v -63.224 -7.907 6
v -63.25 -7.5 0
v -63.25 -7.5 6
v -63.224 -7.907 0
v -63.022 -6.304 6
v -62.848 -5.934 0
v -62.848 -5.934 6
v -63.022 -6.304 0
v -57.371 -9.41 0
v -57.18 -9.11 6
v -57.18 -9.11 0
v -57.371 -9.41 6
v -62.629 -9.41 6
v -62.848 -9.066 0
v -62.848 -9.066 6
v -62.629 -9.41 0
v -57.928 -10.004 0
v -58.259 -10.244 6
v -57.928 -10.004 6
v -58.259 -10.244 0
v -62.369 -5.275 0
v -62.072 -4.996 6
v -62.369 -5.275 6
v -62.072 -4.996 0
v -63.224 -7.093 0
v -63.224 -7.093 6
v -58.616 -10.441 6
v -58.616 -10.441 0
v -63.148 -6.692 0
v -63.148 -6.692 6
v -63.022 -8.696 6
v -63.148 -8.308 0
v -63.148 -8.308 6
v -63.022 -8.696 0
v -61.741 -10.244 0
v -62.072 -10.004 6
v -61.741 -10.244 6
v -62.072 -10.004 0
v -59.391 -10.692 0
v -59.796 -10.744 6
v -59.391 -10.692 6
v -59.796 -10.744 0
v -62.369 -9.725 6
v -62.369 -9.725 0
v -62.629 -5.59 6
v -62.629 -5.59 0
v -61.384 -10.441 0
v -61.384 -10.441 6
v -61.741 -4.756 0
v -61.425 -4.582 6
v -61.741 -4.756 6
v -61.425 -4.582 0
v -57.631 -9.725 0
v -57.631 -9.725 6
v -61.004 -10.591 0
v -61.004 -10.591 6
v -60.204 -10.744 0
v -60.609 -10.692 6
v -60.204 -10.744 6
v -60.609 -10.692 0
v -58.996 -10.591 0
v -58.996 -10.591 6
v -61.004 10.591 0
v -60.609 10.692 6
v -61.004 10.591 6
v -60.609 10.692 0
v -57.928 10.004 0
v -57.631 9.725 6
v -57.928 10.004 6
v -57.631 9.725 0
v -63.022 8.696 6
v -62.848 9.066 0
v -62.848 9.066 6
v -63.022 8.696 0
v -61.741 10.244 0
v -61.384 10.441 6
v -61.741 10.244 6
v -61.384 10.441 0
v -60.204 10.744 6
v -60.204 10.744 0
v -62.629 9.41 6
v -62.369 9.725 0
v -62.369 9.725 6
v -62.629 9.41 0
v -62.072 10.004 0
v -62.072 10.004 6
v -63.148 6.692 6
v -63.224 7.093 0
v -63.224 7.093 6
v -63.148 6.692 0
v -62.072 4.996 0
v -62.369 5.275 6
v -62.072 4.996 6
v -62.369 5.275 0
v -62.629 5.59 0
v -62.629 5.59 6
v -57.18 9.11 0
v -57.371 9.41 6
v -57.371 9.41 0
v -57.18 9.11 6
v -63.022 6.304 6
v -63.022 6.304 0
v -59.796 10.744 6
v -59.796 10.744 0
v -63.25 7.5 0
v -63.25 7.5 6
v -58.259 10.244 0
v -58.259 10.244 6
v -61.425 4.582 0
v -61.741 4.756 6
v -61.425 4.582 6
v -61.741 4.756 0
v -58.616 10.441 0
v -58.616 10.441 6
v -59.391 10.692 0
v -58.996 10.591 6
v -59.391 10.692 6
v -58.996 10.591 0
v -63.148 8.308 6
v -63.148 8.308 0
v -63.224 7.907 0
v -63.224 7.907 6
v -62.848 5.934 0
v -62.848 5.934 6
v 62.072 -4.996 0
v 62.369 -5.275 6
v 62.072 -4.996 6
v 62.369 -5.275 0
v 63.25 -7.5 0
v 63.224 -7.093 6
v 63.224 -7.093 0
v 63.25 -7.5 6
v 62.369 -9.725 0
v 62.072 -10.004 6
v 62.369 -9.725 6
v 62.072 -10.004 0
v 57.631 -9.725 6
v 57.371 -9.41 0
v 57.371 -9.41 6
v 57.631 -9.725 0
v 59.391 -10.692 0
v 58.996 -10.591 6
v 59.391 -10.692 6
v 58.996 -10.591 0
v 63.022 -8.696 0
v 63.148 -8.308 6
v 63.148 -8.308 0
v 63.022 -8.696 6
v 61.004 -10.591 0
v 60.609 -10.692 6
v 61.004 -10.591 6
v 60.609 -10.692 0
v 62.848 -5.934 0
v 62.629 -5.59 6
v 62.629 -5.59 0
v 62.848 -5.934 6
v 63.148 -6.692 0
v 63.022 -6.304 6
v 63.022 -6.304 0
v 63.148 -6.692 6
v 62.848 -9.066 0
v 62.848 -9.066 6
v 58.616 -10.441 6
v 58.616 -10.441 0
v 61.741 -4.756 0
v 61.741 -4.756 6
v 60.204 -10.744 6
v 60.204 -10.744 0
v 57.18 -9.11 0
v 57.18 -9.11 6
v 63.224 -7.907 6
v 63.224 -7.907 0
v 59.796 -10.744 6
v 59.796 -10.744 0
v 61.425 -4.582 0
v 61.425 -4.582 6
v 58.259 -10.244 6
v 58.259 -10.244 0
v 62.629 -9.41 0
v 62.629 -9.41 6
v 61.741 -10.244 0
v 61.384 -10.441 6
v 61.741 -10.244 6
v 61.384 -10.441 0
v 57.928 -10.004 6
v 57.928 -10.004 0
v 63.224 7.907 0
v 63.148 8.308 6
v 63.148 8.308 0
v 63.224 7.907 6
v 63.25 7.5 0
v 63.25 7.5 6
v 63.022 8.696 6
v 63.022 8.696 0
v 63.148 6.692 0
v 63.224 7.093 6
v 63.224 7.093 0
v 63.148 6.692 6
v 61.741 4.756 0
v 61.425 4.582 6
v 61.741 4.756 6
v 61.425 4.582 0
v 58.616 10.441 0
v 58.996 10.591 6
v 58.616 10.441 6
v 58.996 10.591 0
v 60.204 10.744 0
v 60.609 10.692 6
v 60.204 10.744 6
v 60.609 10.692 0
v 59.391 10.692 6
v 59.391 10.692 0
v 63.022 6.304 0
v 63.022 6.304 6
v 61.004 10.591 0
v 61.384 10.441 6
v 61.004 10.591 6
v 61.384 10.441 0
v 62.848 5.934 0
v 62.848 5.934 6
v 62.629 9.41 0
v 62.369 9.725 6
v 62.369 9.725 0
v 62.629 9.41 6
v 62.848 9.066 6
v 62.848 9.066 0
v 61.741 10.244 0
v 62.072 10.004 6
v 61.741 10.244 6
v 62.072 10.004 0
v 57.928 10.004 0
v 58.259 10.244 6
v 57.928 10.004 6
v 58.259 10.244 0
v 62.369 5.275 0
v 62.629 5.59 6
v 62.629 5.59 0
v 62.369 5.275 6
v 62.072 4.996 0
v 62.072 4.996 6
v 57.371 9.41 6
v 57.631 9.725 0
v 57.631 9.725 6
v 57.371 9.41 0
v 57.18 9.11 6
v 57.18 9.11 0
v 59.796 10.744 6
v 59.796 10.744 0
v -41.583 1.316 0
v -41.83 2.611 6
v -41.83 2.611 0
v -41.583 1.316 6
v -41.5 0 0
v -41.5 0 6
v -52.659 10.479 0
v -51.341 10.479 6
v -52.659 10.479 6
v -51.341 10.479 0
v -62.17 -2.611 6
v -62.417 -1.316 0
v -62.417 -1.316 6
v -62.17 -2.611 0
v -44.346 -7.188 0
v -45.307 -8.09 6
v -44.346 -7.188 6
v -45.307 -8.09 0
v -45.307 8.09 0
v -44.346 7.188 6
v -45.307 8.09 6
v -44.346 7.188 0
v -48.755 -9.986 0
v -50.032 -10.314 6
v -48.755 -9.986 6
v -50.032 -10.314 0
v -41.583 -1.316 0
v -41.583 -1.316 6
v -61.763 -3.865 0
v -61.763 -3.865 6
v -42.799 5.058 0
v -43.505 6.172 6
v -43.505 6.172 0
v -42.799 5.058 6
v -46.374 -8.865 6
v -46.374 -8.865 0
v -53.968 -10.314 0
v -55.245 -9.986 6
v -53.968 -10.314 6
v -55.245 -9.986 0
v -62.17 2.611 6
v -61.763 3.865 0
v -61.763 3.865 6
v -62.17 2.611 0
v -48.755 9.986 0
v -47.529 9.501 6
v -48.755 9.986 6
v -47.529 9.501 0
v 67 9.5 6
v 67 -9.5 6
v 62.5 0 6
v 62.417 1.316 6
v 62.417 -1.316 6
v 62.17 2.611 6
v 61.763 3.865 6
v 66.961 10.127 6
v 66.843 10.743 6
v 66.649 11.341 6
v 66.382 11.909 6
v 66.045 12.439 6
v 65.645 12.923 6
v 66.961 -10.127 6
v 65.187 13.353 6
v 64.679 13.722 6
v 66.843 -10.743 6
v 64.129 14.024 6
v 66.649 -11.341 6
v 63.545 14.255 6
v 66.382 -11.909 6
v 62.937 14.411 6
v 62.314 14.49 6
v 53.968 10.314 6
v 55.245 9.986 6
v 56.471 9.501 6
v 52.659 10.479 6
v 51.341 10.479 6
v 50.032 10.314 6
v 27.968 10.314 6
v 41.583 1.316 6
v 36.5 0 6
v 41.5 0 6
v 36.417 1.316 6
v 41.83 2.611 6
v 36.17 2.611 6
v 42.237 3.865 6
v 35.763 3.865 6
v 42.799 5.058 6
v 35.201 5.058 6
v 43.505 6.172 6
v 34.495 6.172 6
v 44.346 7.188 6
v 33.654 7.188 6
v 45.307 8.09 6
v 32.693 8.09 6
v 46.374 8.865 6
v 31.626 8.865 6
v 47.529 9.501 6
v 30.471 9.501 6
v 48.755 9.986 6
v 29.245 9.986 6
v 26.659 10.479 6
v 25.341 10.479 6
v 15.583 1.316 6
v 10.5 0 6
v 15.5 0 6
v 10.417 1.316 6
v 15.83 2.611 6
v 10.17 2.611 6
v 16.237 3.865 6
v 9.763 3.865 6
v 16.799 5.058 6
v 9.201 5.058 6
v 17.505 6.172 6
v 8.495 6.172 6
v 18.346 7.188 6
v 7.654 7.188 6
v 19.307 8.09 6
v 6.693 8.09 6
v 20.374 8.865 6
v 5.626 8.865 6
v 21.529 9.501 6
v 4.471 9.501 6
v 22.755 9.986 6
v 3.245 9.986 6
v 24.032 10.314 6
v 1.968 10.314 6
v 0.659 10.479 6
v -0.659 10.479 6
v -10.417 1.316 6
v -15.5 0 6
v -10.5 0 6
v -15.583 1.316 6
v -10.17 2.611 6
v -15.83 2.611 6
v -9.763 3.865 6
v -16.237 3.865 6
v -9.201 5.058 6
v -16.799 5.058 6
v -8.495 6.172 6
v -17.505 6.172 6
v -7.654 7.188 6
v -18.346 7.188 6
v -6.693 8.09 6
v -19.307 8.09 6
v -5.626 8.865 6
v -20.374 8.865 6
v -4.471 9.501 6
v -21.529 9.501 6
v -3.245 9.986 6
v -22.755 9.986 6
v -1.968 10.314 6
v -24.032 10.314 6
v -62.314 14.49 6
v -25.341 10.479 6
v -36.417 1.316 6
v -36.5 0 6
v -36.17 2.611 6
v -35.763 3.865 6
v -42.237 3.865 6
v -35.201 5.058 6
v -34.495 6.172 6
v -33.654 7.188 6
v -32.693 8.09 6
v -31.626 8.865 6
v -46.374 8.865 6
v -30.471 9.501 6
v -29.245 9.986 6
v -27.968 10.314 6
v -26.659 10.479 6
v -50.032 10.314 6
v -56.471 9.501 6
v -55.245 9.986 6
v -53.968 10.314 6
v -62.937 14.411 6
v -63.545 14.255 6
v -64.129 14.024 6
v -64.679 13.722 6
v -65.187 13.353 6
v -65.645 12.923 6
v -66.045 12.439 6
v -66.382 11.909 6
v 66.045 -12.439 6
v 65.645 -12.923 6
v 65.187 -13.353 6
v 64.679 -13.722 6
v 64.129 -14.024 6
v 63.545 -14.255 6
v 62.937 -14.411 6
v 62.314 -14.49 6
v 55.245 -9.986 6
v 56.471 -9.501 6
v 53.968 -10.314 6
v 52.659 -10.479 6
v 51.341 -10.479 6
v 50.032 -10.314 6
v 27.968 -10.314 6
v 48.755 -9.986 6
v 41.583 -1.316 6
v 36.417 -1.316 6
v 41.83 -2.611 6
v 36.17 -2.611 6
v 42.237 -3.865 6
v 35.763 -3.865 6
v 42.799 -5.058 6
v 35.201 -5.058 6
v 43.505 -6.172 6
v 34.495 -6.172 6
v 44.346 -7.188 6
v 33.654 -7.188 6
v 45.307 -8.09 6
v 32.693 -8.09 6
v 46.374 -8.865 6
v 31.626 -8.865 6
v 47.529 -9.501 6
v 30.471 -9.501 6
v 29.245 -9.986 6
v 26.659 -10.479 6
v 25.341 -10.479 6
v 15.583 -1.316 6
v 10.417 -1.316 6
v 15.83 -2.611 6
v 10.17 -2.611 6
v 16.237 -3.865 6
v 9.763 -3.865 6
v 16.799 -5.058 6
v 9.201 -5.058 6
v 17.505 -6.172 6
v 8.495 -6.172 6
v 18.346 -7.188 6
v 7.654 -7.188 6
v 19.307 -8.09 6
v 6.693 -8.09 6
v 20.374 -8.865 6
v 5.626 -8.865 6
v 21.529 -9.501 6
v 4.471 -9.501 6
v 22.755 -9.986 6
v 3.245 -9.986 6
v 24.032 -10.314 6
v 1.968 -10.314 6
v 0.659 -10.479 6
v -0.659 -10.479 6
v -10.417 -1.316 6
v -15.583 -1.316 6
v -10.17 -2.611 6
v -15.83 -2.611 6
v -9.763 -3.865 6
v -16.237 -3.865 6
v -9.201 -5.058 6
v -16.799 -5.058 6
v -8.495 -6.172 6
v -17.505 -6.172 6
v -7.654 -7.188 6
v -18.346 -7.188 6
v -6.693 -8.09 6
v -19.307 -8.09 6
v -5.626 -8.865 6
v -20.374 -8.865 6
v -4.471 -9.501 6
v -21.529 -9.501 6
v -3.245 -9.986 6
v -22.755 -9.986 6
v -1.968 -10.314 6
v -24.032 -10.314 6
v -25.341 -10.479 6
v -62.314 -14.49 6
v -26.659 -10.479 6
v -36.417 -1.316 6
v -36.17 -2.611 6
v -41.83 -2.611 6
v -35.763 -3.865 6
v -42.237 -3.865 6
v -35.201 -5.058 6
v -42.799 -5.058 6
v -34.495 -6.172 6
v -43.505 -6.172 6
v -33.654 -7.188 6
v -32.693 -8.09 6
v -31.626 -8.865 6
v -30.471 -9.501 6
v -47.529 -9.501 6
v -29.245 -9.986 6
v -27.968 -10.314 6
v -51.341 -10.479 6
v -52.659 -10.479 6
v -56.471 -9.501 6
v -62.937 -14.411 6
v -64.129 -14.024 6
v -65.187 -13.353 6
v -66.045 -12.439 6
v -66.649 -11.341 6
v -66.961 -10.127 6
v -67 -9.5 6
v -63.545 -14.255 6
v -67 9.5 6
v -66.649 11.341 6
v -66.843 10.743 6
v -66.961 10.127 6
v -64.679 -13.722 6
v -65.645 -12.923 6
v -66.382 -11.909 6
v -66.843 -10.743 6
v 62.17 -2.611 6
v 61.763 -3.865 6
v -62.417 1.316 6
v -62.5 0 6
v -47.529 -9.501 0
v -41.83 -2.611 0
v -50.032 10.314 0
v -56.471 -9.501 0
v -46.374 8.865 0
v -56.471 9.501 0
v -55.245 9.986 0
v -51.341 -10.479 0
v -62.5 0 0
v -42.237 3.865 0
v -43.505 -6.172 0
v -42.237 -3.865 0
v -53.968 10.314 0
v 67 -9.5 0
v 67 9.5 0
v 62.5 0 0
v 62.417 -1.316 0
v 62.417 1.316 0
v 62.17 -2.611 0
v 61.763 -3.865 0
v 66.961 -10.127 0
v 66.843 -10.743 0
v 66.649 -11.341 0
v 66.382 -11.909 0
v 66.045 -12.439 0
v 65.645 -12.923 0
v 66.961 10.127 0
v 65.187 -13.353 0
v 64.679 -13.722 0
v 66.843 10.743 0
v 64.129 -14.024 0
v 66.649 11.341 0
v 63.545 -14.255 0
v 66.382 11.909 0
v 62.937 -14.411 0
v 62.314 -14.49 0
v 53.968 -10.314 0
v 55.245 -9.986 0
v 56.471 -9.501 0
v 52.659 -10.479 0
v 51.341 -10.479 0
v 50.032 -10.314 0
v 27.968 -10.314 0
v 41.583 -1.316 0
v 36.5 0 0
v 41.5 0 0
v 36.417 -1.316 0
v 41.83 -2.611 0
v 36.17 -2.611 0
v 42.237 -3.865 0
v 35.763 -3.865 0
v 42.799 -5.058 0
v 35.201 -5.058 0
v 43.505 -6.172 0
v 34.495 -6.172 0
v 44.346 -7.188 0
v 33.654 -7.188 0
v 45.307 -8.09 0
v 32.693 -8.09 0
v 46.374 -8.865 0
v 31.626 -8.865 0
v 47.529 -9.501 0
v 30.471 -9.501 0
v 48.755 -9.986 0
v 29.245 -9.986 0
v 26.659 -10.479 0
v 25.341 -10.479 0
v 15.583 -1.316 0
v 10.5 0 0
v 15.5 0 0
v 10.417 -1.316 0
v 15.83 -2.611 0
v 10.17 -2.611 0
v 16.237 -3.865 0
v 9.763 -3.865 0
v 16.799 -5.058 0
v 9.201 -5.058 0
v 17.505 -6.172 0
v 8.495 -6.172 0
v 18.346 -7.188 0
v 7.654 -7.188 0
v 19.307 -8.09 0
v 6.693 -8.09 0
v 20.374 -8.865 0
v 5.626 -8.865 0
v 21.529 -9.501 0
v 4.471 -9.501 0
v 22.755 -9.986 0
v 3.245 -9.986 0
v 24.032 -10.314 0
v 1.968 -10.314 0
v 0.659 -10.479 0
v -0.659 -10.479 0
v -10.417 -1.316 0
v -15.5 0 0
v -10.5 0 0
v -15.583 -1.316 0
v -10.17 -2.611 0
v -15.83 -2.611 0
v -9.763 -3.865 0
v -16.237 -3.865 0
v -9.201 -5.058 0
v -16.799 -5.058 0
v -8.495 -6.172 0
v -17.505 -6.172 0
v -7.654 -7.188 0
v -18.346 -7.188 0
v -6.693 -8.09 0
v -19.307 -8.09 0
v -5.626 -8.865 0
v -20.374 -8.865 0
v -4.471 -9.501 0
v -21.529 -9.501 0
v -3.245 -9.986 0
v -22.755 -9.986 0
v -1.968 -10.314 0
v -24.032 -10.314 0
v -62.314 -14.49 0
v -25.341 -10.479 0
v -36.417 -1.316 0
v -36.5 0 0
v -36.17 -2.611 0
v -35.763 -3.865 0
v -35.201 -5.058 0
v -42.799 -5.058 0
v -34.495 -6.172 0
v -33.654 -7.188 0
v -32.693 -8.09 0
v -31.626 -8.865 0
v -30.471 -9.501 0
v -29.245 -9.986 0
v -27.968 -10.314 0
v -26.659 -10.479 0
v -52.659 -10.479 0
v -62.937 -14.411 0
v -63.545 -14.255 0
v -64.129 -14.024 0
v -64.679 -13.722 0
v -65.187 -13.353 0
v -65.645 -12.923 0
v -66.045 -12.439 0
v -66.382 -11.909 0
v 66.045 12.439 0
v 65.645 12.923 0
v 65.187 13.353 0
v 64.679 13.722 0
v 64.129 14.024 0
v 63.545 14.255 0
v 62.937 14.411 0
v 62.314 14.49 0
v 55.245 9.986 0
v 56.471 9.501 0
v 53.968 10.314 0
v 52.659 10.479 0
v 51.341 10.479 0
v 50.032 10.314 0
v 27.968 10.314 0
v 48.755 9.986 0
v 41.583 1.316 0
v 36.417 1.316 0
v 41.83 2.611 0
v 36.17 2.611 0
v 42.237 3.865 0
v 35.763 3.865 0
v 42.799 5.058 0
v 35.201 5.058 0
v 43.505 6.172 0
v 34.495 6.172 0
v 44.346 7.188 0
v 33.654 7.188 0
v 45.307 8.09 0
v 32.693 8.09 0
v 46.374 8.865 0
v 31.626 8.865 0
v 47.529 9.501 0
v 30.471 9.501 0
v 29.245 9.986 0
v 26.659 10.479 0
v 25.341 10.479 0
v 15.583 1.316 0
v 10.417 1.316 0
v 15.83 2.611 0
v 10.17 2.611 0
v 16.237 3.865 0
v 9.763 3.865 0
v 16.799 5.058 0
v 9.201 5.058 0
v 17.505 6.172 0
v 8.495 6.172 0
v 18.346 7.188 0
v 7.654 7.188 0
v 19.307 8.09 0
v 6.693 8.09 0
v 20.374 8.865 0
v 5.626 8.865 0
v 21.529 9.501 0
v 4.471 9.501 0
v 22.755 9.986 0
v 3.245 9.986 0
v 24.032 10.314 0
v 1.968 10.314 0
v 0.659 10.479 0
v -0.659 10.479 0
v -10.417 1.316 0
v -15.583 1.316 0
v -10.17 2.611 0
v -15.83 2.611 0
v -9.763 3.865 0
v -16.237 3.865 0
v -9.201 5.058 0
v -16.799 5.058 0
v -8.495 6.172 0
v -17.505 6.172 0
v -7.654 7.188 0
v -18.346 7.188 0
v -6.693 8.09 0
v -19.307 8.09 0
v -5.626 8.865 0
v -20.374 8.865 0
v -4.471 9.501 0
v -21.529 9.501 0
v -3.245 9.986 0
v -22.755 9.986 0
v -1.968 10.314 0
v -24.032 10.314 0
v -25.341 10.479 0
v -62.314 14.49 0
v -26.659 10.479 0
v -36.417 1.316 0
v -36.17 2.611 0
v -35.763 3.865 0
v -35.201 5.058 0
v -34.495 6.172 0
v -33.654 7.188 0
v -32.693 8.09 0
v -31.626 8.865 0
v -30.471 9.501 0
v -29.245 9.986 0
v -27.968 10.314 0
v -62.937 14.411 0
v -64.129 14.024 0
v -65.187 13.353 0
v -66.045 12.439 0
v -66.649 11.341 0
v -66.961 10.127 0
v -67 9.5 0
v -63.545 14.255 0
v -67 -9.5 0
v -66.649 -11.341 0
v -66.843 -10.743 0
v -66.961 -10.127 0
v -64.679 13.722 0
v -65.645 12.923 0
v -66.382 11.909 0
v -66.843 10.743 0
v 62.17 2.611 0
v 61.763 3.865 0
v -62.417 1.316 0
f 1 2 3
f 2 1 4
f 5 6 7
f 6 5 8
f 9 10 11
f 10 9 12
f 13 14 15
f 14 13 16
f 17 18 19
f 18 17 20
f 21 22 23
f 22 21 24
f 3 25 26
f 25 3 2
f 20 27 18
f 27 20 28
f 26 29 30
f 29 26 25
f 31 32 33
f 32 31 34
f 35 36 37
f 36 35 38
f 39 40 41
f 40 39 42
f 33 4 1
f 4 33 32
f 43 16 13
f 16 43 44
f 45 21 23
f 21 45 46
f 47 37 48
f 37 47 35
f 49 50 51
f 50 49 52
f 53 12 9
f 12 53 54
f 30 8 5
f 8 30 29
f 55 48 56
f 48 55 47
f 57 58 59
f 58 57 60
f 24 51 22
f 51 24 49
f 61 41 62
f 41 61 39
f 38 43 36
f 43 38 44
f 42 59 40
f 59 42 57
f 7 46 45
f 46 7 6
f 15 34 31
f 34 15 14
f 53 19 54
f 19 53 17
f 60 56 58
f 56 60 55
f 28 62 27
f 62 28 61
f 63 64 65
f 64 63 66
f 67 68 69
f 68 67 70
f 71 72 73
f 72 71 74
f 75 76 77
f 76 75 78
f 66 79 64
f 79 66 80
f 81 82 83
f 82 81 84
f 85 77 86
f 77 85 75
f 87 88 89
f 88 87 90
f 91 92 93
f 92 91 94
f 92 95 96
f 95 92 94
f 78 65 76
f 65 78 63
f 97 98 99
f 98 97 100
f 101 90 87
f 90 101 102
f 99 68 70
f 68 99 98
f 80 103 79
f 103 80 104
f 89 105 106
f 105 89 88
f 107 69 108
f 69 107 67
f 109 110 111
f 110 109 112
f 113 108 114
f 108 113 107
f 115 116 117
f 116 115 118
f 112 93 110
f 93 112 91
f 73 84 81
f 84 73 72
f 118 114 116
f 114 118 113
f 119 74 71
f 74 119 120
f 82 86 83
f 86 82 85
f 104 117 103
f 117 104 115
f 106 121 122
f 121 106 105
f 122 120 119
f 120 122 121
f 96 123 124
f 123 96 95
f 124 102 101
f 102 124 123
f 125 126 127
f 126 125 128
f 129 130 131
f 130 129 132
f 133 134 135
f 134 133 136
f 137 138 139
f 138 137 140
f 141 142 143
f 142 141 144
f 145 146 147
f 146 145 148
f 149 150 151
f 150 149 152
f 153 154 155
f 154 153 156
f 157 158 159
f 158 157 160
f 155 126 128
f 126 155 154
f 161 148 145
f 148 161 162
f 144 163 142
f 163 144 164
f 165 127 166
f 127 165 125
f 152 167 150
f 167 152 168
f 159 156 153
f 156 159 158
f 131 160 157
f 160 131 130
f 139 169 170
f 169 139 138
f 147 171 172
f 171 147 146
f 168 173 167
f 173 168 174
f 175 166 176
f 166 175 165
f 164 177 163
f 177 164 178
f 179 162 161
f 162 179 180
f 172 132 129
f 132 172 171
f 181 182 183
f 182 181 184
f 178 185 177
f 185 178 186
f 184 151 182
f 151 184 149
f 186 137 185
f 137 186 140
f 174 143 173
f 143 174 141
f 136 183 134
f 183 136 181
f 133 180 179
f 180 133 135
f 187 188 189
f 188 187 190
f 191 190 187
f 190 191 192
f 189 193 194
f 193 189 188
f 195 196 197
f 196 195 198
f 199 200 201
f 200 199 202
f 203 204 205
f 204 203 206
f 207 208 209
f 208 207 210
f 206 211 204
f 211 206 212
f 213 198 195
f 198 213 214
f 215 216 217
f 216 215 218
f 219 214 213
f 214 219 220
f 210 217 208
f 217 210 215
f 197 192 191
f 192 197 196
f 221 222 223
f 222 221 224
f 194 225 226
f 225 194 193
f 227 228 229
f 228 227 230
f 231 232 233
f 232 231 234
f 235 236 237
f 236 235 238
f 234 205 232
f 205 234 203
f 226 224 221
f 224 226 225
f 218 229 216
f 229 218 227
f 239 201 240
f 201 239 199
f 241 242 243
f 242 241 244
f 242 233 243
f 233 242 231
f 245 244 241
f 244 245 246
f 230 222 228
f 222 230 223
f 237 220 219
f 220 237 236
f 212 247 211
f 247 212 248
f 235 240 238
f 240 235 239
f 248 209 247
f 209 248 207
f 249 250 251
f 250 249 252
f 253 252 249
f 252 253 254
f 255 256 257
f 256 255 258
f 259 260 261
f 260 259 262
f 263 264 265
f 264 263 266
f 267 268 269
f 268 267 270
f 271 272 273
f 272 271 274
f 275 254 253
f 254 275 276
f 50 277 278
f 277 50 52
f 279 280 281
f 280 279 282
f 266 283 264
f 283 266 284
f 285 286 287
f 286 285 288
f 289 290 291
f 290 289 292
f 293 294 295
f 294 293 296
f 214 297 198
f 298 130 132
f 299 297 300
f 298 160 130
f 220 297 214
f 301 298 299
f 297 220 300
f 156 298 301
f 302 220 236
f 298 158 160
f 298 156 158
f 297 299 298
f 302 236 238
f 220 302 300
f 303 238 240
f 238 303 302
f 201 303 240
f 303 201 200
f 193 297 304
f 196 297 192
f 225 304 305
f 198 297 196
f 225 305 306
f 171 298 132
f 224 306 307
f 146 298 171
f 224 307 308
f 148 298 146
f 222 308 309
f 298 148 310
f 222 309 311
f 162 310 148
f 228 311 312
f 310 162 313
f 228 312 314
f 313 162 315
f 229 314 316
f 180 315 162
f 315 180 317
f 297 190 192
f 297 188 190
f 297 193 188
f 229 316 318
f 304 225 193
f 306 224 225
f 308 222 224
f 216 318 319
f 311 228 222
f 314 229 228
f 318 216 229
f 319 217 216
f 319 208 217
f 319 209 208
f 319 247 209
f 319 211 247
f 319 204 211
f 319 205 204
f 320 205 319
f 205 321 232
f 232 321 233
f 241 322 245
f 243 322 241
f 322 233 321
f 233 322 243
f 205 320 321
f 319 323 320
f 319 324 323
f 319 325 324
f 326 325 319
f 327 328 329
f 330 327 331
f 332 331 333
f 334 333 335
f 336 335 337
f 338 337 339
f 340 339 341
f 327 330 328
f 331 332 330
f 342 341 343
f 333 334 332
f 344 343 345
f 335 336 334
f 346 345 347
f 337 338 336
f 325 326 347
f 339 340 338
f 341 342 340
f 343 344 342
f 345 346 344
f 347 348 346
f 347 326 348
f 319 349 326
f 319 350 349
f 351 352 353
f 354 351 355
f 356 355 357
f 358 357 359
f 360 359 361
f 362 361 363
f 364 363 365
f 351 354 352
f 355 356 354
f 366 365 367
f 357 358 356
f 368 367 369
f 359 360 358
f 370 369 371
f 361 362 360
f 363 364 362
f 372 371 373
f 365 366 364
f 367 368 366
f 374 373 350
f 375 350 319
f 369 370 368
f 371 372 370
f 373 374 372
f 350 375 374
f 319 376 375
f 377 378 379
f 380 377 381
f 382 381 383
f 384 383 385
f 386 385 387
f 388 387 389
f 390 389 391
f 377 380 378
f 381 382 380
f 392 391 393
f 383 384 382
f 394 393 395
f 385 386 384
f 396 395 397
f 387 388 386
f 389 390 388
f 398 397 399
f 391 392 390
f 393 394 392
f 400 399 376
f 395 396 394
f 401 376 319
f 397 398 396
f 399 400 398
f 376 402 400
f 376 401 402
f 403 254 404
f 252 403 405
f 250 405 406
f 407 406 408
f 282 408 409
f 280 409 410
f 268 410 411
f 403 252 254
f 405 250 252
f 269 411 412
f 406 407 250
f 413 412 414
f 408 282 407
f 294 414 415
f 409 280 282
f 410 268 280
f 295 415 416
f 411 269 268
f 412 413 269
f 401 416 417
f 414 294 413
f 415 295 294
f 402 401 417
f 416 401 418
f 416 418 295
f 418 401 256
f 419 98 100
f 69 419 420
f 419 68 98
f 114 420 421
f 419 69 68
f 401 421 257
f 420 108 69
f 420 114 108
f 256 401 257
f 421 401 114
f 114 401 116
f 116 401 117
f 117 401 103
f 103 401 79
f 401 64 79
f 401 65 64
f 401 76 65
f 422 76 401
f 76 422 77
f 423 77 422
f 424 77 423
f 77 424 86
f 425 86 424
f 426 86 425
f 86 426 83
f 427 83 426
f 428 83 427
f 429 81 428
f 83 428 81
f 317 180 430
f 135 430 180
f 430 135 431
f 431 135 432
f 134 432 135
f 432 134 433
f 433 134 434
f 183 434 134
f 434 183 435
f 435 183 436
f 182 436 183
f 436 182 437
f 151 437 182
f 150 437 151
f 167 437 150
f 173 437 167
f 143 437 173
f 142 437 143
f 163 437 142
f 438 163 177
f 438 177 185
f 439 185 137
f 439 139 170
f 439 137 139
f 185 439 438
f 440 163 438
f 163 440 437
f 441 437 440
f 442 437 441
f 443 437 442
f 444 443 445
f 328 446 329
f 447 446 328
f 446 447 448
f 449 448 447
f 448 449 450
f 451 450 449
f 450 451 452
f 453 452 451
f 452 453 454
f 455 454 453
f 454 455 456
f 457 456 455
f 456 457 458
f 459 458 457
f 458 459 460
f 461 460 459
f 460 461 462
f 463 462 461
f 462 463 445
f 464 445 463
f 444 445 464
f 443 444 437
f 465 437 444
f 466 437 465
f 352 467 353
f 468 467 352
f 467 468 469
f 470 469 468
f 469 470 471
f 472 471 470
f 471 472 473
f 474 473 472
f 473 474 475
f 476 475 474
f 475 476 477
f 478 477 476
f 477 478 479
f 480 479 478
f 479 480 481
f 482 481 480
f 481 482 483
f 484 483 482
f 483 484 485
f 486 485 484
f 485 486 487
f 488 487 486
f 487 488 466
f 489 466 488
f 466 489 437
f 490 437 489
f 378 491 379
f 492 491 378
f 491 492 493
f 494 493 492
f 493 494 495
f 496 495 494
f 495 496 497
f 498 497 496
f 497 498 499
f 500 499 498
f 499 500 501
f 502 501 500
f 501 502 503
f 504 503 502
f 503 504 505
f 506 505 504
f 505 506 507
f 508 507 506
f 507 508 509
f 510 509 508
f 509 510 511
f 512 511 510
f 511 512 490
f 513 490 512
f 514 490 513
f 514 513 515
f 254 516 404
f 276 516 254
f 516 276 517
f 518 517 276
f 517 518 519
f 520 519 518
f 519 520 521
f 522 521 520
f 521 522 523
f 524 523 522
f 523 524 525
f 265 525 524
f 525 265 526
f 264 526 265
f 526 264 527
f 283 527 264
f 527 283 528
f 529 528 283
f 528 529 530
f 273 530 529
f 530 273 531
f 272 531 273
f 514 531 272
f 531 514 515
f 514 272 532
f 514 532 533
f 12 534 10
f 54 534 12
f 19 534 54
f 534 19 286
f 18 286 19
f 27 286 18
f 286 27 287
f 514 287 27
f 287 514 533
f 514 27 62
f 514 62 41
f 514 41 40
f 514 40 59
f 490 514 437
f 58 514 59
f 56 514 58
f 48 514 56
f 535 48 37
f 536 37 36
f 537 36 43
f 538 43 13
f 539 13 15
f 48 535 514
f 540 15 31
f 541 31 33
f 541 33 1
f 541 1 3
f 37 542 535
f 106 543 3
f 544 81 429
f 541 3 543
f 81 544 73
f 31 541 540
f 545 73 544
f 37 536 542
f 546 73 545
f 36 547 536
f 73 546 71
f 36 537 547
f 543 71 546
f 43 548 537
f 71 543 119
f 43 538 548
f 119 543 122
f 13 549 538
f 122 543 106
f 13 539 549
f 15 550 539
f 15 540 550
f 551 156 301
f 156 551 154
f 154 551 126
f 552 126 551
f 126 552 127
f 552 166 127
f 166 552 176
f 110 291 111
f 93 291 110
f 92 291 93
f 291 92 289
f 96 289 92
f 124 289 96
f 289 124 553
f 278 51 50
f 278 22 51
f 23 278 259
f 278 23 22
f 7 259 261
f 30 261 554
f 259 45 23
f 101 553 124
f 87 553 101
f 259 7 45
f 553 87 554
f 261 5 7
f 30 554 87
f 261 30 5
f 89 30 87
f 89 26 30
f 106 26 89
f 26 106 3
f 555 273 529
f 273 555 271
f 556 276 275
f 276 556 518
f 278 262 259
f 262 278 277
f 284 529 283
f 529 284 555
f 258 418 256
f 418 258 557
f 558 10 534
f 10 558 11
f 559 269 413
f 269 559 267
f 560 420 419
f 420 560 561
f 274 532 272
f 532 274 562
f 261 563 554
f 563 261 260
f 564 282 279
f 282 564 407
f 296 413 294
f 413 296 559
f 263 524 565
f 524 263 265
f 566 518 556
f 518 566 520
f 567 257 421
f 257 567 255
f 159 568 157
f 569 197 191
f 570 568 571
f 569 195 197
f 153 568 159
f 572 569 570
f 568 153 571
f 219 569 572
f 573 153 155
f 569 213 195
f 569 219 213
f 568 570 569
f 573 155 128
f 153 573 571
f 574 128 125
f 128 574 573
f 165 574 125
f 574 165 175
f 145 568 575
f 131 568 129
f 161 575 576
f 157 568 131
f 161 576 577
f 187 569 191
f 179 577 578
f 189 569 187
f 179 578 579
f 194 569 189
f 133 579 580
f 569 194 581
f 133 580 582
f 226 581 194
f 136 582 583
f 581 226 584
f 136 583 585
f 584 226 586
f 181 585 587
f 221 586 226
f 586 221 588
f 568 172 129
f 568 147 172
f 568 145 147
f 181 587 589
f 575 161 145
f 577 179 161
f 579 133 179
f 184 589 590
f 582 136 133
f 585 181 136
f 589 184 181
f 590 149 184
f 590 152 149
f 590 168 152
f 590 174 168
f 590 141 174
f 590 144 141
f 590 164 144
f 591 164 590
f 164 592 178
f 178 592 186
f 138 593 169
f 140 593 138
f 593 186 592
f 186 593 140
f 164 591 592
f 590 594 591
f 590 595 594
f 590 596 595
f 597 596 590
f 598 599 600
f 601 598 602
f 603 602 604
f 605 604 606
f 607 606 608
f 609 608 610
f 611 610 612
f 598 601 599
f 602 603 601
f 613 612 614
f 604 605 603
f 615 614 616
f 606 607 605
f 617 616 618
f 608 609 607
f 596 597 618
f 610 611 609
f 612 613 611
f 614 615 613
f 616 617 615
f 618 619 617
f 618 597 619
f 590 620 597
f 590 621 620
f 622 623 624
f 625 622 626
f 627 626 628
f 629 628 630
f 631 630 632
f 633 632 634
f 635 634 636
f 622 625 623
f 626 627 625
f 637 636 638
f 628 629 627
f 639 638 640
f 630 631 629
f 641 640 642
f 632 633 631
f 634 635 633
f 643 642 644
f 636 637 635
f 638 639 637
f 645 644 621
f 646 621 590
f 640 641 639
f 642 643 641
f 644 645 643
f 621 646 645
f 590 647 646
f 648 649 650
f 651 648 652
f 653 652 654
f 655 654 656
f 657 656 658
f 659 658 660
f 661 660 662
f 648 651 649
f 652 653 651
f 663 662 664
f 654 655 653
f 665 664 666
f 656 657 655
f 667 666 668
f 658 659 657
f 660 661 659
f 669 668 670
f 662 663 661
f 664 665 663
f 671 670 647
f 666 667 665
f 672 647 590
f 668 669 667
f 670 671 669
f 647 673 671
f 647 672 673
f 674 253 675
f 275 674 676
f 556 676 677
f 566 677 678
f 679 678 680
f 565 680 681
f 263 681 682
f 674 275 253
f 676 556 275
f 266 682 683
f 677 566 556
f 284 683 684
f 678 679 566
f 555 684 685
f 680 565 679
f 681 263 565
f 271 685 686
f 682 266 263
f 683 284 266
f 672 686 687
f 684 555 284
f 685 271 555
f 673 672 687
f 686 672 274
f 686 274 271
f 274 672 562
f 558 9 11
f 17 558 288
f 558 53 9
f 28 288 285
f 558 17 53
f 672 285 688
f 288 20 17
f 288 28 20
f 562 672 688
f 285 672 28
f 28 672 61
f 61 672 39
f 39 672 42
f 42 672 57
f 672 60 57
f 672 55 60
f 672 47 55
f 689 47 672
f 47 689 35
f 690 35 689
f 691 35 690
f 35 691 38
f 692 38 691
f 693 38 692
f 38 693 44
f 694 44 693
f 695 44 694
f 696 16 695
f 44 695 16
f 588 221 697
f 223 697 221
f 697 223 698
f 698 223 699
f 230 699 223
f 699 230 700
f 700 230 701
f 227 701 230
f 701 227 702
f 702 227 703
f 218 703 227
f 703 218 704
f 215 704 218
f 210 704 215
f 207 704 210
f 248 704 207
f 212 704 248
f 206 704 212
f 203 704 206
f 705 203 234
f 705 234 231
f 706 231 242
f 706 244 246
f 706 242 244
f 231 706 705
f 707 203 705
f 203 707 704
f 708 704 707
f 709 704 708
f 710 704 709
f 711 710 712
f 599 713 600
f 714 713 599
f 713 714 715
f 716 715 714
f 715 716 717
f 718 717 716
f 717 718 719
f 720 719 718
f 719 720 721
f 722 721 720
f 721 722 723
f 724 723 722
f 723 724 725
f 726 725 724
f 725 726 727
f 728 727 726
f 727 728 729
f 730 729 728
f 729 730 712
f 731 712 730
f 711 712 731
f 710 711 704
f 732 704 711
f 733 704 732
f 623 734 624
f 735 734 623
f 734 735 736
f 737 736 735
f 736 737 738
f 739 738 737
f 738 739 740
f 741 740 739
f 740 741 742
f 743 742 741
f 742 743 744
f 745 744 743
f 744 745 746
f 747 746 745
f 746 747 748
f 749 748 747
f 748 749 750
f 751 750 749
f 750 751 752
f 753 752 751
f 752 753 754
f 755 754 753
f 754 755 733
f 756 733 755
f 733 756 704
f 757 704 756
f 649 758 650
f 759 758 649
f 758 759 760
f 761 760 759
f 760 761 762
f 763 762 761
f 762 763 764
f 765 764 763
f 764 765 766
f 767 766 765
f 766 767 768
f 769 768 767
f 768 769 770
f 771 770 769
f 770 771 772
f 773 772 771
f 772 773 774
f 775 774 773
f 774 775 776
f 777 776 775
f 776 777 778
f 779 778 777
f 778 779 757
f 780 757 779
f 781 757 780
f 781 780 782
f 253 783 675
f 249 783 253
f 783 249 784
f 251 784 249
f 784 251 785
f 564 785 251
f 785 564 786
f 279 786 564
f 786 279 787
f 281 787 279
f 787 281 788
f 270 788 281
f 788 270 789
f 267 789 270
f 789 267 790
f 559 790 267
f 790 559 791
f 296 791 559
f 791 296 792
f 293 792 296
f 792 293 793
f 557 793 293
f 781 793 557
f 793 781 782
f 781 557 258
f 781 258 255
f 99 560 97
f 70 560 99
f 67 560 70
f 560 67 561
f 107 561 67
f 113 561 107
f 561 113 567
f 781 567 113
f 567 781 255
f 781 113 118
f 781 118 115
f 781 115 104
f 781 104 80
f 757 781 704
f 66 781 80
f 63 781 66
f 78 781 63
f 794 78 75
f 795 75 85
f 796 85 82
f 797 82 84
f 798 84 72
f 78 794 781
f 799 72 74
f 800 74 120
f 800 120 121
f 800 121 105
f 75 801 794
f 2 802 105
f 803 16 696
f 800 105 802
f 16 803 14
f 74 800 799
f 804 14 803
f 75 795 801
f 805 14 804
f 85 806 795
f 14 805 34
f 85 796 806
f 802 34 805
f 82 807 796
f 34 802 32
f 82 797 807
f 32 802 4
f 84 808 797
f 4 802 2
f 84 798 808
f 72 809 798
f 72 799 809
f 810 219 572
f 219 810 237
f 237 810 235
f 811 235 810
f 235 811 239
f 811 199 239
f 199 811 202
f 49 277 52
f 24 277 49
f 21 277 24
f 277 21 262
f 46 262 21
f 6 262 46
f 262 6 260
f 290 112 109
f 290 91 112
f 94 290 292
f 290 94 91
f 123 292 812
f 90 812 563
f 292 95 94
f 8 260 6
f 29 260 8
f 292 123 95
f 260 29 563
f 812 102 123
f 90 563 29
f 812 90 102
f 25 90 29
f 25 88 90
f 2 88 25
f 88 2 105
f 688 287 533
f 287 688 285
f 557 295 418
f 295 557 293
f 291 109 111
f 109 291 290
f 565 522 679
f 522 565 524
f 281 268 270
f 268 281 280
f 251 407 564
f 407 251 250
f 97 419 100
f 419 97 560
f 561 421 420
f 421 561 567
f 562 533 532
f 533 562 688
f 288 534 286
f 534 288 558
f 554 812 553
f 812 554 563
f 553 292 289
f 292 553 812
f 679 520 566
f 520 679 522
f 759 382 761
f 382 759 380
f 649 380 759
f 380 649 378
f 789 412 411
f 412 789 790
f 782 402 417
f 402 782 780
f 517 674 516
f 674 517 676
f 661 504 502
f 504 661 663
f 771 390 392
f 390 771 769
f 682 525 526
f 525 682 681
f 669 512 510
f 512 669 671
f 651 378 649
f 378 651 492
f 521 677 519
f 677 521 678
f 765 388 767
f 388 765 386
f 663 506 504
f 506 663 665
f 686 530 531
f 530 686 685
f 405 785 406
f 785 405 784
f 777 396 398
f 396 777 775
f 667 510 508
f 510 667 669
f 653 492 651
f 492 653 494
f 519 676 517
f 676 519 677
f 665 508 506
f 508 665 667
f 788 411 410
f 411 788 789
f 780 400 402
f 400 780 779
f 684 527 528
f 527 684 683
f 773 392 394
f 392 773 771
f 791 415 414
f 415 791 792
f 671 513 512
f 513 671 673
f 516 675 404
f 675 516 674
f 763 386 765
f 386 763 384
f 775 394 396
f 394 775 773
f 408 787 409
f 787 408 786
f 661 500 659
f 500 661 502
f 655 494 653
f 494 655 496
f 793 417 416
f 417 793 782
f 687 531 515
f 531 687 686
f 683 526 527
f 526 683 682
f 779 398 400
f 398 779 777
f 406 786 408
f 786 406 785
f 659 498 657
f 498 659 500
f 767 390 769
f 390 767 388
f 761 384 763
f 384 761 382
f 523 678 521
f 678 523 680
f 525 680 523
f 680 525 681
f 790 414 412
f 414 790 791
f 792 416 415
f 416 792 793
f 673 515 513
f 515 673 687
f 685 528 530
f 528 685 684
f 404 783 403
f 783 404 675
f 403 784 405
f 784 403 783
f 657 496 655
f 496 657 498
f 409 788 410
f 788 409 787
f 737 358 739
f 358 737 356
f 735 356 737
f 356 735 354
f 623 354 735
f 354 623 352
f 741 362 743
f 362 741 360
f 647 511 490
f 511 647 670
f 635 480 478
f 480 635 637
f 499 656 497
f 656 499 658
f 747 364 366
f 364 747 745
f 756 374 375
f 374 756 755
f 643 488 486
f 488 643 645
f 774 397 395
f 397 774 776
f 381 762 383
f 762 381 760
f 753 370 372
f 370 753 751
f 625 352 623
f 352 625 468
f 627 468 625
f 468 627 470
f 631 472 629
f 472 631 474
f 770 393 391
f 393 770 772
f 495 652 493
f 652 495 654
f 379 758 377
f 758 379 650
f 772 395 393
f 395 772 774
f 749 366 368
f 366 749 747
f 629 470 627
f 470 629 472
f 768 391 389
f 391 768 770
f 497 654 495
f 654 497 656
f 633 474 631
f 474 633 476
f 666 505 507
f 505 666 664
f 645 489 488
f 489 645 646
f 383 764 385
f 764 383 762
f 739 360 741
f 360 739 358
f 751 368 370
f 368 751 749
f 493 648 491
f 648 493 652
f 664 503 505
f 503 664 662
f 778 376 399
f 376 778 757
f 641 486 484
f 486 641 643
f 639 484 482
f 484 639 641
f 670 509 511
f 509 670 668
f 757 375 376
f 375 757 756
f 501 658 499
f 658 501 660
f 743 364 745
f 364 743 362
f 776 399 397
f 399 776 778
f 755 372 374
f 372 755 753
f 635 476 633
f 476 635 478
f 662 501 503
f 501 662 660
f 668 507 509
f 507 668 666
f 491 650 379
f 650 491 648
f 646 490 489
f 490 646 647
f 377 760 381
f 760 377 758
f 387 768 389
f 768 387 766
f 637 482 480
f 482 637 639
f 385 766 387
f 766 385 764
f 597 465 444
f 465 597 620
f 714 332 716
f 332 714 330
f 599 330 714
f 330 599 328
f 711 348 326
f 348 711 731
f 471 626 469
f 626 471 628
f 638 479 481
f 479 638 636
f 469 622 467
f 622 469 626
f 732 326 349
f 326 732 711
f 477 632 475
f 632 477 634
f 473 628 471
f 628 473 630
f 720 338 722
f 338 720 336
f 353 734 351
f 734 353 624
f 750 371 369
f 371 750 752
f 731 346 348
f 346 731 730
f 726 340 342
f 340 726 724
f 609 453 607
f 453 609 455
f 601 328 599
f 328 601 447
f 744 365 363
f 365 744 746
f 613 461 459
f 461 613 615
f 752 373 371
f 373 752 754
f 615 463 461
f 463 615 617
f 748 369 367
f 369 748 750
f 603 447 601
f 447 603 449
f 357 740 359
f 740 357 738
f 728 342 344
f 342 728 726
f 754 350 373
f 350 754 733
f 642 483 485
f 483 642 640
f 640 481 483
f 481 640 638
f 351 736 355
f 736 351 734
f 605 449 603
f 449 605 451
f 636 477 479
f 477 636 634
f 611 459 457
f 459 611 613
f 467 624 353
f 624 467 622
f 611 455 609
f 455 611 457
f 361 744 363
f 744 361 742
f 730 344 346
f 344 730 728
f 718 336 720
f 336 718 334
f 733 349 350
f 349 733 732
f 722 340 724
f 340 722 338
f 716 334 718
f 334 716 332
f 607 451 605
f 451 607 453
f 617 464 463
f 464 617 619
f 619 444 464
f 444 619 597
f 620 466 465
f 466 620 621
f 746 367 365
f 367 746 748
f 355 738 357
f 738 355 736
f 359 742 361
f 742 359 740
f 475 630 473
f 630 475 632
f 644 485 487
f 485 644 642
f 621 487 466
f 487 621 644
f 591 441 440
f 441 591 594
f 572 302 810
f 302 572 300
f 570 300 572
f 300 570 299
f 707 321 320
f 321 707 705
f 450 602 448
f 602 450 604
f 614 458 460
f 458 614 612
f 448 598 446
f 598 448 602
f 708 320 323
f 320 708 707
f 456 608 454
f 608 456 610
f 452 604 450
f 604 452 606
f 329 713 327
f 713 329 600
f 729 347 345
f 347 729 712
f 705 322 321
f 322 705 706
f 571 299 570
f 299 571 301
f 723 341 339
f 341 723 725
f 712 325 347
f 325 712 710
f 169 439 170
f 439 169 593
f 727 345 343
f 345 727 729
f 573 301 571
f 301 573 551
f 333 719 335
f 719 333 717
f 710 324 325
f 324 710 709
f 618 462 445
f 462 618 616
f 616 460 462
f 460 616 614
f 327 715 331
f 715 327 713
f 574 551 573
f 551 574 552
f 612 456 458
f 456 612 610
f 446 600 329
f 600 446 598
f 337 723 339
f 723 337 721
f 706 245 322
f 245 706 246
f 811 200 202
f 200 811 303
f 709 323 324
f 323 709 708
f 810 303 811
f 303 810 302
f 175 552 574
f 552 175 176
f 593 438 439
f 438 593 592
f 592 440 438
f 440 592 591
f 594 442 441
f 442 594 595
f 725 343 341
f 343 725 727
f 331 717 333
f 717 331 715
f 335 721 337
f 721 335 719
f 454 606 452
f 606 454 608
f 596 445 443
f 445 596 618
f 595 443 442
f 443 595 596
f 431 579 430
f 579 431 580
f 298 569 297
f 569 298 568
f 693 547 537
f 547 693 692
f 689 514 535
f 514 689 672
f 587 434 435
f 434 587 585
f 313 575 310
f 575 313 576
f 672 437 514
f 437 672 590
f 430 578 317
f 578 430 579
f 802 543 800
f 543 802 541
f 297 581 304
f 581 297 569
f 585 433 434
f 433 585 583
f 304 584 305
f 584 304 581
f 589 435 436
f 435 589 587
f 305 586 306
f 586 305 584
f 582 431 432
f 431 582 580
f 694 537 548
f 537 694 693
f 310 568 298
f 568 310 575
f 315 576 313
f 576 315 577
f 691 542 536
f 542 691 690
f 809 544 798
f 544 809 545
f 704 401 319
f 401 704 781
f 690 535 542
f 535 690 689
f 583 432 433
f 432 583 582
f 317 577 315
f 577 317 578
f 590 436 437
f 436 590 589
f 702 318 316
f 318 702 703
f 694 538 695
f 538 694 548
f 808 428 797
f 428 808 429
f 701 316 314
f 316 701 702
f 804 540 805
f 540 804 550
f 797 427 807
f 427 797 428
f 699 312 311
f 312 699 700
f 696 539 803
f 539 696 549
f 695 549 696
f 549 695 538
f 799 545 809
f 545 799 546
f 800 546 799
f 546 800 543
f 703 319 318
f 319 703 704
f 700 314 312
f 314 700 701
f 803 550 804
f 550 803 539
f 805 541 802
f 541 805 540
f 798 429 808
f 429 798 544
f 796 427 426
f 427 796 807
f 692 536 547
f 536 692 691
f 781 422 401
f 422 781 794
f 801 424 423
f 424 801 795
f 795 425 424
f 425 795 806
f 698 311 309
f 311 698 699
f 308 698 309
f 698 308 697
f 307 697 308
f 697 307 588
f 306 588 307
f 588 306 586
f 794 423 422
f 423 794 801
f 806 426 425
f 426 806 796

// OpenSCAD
$fn = 50;


difference() {
	union() {
		hull() {
			translate(v = [-62.0000000000, 9.5000000000, 0]) {
				cylinder(h = 6, r = 5);
			}
			translate(v = [62.0000000000, 9.5000000000, 0]) {
				cylinder(h = 6, r = 5);
			}
			translate(v = [-62.0000000000, -9.5000000000, 0]) {
				cylinder(h = 6, r = 5);
			}
			translate(v = [62.0000000000, -9.5000000000, 0]) {
				cylinder(h = 6, r = 5);
			}
		}
	}
	union() {
		#translate(v = [-60.0000000000, -7.5000000000, -100.0000000000]) {
			cylinder(h = 200, r = 3.2500000000);
		}
		#translate(v = [-60.0000000000, 7.5000000000, -100.0000000000]) {
			cylinder(h = 200, r = 3.2500000000);
		}
		#translate(v = [60.0000000000, -7.5000000000, -100.0000000000]) {
			cylinder(h = 200, r = 3.2500000000);
		}
		#translate(v = [60.0000000000, 7.5000000000, -100.0000000000]) {
			cylinder(h = 200, r = 3.2500000000);
		}
		#translate(v = [-52.0000000000, 0, 0]) {
			cylinder(h = 6, r = 10.5000000000);
		}
		#translate(v = [-26.0000000000, 0, 0]) {
			cylinder(h = 6, r = 10.5000000000);
		}
		#cylinder(h = 6, r = 10.5000000000);
		#translate(v = [26.0000000000, 0, 0]) {
			cylinder(h = 6, r = 10.5000000000);
		}
		#translate(v = [52.0000000000, 0, 0]) {
			cylinder(h = 6, r = 10.5000000000);
		}
	}
}
